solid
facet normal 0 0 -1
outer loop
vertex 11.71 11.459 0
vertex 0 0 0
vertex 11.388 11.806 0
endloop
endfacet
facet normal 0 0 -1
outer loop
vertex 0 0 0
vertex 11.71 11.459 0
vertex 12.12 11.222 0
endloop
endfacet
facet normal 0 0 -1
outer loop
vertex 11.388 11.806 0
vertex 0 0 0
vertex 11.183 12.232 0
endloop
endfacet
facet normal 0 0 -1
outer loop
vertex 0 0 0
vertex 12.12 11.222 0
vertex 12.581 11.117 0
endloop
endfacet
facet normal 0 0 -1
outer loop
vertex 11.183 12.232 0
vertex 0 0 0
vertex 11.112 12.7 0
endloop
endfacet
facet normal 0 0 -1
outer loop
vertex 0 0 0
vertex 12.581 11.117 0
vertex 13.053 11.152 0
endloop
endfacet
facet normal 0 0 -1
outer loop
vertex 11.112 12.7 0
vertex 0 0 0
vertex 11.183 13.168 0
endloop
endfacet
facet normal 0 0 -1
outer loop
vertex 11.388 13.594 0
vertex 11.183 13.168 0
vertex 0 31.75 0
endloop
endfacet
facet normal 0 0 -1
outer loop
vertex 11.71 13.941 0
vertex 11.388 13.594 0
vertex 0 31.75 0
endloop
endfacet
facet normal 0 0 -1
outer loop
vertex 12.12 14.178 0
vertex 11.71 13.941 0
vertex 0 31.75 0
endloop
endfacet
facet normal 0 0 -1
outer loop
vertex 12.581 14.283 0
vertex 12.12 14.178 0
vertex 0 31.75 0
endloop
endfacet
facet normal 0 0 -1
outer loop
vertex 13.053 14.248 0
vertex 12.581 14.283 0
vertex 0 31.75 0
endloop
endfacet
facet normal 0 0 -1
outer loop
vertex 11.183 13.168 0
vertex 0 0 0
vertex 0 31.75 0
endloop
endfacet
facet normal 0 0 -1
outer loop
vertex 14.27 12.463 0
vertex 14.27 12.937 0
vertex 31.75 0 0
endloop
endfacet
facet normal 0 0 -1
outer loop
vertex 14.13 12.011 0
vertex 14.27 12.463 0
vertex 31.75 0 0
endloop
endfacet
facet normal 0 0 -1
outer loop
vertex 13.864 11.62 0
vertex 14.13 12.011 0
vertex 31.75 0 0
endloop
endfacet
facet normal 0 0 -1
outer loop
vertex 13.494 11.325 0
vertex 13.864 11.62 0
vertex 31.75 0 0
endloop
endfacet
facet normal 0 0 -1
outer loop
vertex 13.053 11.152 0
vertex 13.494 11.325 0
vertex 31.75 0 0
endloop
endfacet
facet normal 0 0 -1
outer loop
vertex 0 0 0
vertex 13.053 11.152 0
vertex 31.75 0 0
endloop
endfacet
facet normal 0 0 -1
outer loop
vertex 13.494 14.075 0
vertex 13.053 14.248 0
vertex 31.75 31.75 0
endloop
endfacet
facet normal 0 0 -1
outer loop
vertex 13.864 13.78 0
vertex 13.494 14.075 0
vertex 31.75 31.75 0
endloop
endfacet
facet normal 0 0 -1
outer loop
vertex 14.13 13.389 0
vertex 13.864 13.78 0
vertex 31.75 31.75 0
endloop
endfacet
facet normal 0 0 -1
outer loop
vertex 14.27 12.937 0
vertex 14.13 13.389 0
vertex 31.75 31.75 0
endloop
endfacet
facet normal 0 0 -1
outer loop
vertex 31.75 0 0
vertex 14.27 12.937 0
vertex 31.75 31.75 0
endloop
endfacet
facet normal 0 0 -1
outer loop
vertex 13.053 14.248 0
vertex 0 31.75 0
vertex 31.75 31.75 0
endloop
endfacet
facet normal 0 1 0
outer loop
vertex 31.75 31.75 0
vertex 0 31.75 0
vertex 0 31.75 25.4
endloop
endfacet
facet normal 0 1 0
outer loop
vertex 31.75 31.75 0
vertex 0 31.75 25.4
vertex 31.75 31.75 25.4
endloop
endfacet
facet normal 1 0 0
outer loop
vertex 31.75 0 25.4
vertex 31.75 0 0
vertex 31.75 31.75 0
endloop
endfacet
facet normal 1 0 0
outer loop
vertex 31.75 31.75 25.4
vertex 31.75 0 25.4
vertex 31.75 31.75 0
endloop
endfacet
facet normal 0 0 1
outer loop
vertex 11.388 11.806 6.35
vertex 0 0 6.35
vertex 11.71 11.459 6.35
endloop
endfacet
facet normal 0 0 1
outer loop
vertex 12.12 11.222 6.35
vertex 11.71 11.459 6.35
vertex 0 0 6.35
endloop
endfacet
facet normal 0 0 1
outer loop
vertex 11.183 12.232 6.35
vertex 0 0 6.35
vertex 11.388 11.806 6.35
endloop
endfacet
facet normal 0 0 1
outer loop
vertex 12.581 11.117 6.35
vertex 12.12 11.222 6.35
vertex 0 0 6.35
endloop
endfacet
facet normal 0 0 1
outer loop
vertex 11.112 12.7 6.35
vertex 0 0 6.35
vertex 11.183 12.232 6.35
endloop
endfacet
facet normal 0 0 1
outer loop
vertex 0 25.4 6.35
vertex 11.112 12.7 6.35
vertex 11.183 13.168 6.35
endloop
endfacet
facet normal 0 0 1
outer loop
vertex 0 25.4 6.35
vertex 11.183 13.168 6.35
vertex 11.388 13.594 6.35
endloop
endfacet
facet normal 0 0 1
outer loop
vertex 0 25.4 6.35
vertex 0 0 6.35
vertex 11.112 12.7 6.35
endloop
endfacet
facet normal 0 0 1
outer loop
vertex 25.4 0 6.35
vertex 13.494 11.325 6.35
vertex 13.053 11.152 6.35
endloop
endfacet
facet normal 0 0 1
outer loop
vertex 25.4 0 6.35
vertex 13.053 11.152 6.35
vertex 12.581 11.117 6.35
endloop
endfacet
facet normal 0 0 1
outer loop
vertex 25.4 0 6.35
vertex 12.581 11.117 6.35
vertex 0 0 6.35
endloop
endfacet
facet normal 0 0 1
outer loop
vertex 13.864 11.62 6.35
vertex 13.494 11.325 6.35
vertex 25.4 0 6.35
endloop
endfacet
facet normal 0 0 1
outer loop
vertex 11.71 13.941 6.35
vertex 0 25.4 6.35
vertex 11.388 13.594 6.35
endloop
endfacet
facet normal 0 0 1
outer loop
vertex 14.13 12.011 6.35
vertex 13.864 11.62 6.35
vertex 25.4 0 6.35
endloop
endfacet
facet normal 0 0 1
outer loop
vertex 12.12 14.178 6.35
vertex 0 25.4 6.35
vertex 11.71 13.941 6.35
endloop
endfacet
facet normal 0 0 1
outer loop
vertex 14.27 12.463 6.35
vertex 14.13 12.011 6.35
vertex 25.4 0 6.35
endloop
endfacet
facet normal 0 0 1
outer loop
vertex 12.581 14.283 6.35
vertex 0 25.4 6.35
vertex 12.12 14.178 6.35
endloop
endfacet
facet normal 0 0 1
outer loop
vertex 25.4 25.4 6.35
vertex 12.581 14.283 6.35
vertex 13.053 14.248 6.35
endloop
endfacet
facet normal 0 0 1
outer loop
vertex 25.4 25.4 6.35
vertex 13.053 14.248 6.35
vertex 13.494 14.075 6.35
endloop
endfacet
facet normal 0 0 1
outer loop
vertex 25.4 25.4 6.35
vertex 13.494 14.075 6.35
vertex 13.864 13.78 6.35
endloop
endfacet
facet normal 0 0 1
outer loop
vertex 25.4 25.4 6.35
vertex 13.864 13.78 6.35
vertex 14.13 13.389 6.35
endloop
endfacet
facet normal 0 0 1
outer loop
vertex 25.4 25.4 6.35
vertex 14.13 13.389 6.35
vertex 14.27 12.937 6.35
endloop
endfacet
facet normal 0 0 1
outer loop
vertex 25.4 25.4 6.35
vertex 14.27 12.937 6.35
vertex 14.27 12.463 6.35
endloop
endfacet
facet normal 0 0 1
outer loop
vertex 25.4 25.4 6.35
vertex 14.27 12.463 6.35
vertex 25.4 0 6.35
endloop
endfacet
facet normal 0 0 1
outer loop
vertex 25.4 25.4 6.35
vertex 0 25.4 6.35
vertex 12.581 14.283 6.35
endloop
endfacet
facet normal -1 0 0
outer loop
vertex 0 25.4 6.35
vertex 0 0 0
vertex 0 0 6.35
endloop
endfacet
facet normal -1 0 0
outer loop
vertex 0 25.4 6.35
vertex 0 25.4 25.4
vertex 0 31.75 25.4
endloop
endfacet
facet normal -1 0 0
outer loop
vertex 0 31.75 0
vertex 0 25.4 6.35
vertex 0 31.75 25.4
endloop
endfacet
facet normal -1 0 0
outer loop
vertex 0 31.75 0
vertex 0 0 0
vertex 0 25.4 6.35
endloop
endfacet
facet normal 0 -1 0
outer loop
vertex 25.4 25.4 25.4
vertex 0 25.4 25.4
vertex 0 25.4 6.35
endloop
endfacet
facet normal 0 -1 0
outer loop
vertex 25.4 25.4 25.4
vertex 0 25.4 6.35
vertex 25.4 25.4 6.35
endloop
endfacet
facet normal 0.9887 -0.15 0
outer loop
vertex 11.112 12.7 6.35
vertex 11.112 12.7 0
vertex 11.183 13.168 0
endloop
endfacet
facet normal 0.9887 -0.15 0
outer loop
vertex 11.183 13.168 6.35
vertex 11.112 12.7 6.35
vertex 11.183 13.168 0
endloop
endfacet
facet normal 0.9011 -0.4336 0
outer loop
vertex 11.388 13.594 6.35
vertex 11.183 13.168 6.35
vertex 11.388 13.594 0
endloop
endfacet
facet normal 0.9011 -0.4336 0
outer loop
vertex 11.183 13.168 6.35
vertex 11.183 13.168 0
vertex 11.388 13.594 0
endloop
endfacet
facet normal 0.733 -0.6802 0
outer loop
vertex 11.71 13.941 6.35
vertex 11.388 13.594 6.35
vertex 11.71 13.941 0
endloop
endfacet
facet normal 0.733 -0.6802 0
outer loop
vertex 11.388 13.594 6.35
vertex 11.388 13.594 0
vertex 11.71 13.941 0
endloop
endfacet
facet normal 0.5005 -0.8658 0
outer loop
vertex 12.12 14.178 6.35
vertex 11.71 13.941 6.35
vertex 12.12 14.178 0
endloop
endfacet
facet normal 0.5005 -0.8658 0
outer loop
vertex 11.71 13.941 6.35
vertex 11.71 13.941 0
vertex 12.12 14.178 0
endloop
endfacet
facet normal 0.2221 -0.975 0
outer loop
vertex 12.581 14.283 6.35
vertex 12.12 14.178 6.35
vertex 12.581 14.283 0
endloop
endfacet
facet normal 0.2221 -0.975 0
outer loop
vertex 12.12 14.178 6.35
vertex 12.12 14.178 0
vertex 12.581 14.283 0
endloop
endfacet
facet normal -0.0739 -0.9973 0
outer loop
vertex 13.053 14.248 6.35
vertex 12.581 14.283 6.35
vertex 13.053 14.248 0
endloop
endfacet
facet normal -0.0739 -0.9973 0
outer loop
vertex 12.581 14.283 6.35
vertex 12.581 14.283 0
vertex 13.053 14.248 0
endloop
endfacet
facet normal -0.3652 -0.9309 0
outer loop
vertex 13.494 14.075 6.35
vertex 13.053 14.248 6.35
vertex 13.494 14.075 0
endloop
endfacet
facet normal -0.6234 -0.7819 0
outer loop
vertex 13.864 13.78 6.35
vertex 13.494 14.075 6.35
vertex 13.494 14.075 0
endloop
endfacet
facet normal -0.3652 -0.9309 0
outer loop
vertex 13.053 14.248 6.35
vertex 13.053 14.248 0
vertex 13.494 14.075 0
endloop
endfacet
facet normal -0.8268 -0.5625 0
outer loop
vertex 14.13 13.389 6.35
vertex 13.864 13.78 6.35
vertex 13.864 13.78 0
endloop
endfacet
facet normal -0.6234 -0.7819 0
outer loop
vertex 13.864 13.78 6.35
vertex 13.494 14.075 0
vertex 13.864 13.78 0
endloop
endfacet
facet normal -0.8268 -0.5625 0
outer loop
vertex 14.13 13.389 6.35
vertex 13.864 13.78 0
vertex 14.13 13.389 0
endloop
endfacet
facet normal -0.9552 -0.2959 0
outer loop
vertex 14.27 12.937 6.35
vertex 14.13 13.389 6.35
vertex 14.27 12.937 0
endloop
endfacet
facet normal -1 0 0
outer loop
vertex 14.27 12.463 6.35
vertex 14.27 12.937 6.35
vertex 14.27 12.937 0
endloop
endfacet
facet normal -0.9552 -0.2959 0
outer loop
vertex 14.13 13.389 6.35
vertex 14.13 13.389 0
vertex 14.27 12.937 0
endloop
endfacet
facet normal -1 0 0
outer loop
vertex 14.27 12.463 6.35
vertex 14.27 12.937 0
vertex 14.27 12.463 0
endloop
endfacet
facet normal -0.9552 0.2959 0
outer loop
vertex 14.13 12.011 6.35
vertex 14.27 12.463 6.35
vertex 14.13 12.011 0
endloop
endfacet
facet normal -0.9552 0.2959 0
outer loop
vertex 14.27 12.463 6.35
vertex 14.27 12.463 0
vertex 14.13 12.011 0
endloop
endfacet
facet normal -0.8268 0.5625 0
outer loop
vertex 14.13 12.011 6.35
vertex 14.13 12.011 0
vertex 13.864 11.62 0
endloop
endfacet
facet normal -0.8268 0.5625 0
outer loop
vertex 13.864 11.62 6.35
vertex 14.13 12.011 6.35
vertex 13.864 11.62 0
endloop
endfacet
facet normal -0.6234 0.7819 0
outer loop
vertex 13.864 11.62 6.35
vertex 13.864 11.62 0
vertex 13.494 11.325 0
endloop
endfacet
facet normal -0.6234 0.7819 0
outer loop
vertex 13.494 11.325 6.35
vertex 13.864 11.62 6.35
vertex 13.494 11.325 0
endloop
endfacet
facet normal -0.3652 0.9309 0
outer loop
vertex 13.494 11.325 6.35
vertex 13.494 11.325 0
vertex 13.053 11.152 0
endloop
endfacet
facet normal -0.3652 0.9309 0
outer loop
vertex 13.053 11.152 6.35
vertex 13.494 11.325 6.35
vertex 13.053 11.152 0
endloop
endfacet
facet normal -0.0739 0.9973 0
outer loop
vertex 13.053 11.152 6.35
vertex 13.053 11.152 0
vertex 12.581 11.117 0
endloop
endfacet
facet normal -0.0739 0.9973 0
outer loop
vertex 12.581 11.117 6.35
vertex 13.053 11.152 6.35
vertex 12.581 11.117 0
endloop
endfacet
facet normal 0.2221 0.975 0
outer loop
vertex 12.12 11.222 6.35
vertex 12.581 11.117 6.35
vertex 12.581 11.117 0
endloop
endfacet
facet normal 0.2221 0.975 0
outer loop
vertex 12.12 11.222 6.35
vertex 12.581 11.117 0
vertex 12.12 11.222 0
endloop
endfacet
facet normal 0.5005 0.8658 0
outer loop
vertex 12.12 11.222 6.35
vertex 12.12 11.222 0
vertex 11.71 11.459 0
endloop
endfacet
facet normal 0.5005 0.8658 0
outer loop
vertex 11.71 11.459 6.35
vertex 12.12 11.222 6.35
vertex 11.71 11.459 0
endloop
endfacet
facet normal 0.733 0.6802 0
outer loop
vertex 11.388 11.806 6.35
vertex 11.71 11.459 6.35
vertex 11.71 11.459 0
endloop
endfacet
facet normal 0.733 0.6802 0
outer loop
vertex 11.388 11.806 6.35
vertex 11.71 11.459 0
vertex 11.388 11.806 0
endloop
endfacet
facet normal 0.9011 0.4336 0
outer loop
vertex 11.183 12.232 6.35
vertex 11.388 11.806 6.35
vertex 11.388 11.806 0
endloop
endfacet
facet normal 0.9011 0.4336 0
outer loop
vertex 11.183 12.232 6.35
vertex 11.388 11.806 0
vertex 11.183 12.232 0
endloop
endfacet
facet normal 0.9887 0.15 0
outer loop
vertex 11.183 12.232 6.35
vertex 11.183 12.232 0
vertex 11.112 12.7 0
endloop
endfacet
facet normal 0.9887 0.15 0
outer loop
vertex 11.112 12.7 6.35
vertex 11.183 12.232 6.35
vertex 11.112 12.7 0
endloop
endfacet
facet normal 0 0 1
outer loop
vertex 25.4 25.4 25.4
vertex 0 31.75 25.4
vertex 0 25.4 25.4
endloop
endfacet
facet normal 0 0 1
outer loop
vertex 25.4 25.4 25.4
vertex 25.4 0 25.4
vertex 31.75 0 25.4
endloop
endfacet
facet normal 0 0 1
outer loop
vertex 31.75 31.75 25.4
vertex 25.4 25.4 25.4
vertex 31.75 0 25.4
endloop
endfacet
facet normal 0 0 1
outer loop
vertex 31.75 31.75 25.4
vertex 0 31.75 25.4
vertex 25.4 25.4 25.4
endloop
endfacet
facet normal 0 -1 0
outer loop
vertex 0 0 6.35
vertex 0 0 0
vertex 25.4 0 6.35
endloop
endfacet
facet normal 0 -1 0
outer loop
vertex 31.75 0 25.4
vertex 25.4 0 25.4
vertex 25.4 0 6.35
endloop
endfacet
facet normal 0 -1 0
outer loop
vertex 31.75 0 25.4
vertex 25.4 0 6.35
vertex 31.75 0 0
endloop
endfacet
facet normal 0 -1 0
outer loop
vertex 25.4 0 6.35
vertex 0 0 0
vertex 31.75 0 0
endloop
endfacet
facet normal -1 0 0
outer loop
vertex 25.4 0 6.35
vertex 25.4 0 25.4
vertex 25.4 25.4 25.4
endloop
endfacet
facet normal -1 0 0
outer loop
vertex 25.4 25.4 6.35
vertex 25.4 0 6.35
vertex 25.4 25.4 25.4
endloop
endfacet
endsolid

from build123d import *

# Parameters (mm, degrees)
F0_W     = 31.75
F0_H     = 31.75
F1_DEPTH = 25.4
F2_W     = 25.4
F2_H     = 25.4
F3_DEPTH = 19.05
F5_D     = 3.175


with BuildPart() as f1:
    # F0 (on Top) → F1 (new body)
    with BuildSketch(Plane.XY):
        with Locations((15.875, 15.875)):
            Rectangle(F0_W, F0_H)
    extrude(amount=F1_DEPTH)

    # F2 (on face) → F3 (cut)
    with BuildSketch(Plane.XY.offset(25.4)):
        with Locations((12.7, 12.7)):
            Rectangle(F2_W, F2_H)
    extrude(amount=-F3_DEPTH, mode=Mode.SUBTRACT)

    # F5 (through all)
    with Locations(Plane.XY.offset(6.35)):
        with Locations((12.7, 12.7)):
            Hole(F5_D / 2)


solid = f1.part
